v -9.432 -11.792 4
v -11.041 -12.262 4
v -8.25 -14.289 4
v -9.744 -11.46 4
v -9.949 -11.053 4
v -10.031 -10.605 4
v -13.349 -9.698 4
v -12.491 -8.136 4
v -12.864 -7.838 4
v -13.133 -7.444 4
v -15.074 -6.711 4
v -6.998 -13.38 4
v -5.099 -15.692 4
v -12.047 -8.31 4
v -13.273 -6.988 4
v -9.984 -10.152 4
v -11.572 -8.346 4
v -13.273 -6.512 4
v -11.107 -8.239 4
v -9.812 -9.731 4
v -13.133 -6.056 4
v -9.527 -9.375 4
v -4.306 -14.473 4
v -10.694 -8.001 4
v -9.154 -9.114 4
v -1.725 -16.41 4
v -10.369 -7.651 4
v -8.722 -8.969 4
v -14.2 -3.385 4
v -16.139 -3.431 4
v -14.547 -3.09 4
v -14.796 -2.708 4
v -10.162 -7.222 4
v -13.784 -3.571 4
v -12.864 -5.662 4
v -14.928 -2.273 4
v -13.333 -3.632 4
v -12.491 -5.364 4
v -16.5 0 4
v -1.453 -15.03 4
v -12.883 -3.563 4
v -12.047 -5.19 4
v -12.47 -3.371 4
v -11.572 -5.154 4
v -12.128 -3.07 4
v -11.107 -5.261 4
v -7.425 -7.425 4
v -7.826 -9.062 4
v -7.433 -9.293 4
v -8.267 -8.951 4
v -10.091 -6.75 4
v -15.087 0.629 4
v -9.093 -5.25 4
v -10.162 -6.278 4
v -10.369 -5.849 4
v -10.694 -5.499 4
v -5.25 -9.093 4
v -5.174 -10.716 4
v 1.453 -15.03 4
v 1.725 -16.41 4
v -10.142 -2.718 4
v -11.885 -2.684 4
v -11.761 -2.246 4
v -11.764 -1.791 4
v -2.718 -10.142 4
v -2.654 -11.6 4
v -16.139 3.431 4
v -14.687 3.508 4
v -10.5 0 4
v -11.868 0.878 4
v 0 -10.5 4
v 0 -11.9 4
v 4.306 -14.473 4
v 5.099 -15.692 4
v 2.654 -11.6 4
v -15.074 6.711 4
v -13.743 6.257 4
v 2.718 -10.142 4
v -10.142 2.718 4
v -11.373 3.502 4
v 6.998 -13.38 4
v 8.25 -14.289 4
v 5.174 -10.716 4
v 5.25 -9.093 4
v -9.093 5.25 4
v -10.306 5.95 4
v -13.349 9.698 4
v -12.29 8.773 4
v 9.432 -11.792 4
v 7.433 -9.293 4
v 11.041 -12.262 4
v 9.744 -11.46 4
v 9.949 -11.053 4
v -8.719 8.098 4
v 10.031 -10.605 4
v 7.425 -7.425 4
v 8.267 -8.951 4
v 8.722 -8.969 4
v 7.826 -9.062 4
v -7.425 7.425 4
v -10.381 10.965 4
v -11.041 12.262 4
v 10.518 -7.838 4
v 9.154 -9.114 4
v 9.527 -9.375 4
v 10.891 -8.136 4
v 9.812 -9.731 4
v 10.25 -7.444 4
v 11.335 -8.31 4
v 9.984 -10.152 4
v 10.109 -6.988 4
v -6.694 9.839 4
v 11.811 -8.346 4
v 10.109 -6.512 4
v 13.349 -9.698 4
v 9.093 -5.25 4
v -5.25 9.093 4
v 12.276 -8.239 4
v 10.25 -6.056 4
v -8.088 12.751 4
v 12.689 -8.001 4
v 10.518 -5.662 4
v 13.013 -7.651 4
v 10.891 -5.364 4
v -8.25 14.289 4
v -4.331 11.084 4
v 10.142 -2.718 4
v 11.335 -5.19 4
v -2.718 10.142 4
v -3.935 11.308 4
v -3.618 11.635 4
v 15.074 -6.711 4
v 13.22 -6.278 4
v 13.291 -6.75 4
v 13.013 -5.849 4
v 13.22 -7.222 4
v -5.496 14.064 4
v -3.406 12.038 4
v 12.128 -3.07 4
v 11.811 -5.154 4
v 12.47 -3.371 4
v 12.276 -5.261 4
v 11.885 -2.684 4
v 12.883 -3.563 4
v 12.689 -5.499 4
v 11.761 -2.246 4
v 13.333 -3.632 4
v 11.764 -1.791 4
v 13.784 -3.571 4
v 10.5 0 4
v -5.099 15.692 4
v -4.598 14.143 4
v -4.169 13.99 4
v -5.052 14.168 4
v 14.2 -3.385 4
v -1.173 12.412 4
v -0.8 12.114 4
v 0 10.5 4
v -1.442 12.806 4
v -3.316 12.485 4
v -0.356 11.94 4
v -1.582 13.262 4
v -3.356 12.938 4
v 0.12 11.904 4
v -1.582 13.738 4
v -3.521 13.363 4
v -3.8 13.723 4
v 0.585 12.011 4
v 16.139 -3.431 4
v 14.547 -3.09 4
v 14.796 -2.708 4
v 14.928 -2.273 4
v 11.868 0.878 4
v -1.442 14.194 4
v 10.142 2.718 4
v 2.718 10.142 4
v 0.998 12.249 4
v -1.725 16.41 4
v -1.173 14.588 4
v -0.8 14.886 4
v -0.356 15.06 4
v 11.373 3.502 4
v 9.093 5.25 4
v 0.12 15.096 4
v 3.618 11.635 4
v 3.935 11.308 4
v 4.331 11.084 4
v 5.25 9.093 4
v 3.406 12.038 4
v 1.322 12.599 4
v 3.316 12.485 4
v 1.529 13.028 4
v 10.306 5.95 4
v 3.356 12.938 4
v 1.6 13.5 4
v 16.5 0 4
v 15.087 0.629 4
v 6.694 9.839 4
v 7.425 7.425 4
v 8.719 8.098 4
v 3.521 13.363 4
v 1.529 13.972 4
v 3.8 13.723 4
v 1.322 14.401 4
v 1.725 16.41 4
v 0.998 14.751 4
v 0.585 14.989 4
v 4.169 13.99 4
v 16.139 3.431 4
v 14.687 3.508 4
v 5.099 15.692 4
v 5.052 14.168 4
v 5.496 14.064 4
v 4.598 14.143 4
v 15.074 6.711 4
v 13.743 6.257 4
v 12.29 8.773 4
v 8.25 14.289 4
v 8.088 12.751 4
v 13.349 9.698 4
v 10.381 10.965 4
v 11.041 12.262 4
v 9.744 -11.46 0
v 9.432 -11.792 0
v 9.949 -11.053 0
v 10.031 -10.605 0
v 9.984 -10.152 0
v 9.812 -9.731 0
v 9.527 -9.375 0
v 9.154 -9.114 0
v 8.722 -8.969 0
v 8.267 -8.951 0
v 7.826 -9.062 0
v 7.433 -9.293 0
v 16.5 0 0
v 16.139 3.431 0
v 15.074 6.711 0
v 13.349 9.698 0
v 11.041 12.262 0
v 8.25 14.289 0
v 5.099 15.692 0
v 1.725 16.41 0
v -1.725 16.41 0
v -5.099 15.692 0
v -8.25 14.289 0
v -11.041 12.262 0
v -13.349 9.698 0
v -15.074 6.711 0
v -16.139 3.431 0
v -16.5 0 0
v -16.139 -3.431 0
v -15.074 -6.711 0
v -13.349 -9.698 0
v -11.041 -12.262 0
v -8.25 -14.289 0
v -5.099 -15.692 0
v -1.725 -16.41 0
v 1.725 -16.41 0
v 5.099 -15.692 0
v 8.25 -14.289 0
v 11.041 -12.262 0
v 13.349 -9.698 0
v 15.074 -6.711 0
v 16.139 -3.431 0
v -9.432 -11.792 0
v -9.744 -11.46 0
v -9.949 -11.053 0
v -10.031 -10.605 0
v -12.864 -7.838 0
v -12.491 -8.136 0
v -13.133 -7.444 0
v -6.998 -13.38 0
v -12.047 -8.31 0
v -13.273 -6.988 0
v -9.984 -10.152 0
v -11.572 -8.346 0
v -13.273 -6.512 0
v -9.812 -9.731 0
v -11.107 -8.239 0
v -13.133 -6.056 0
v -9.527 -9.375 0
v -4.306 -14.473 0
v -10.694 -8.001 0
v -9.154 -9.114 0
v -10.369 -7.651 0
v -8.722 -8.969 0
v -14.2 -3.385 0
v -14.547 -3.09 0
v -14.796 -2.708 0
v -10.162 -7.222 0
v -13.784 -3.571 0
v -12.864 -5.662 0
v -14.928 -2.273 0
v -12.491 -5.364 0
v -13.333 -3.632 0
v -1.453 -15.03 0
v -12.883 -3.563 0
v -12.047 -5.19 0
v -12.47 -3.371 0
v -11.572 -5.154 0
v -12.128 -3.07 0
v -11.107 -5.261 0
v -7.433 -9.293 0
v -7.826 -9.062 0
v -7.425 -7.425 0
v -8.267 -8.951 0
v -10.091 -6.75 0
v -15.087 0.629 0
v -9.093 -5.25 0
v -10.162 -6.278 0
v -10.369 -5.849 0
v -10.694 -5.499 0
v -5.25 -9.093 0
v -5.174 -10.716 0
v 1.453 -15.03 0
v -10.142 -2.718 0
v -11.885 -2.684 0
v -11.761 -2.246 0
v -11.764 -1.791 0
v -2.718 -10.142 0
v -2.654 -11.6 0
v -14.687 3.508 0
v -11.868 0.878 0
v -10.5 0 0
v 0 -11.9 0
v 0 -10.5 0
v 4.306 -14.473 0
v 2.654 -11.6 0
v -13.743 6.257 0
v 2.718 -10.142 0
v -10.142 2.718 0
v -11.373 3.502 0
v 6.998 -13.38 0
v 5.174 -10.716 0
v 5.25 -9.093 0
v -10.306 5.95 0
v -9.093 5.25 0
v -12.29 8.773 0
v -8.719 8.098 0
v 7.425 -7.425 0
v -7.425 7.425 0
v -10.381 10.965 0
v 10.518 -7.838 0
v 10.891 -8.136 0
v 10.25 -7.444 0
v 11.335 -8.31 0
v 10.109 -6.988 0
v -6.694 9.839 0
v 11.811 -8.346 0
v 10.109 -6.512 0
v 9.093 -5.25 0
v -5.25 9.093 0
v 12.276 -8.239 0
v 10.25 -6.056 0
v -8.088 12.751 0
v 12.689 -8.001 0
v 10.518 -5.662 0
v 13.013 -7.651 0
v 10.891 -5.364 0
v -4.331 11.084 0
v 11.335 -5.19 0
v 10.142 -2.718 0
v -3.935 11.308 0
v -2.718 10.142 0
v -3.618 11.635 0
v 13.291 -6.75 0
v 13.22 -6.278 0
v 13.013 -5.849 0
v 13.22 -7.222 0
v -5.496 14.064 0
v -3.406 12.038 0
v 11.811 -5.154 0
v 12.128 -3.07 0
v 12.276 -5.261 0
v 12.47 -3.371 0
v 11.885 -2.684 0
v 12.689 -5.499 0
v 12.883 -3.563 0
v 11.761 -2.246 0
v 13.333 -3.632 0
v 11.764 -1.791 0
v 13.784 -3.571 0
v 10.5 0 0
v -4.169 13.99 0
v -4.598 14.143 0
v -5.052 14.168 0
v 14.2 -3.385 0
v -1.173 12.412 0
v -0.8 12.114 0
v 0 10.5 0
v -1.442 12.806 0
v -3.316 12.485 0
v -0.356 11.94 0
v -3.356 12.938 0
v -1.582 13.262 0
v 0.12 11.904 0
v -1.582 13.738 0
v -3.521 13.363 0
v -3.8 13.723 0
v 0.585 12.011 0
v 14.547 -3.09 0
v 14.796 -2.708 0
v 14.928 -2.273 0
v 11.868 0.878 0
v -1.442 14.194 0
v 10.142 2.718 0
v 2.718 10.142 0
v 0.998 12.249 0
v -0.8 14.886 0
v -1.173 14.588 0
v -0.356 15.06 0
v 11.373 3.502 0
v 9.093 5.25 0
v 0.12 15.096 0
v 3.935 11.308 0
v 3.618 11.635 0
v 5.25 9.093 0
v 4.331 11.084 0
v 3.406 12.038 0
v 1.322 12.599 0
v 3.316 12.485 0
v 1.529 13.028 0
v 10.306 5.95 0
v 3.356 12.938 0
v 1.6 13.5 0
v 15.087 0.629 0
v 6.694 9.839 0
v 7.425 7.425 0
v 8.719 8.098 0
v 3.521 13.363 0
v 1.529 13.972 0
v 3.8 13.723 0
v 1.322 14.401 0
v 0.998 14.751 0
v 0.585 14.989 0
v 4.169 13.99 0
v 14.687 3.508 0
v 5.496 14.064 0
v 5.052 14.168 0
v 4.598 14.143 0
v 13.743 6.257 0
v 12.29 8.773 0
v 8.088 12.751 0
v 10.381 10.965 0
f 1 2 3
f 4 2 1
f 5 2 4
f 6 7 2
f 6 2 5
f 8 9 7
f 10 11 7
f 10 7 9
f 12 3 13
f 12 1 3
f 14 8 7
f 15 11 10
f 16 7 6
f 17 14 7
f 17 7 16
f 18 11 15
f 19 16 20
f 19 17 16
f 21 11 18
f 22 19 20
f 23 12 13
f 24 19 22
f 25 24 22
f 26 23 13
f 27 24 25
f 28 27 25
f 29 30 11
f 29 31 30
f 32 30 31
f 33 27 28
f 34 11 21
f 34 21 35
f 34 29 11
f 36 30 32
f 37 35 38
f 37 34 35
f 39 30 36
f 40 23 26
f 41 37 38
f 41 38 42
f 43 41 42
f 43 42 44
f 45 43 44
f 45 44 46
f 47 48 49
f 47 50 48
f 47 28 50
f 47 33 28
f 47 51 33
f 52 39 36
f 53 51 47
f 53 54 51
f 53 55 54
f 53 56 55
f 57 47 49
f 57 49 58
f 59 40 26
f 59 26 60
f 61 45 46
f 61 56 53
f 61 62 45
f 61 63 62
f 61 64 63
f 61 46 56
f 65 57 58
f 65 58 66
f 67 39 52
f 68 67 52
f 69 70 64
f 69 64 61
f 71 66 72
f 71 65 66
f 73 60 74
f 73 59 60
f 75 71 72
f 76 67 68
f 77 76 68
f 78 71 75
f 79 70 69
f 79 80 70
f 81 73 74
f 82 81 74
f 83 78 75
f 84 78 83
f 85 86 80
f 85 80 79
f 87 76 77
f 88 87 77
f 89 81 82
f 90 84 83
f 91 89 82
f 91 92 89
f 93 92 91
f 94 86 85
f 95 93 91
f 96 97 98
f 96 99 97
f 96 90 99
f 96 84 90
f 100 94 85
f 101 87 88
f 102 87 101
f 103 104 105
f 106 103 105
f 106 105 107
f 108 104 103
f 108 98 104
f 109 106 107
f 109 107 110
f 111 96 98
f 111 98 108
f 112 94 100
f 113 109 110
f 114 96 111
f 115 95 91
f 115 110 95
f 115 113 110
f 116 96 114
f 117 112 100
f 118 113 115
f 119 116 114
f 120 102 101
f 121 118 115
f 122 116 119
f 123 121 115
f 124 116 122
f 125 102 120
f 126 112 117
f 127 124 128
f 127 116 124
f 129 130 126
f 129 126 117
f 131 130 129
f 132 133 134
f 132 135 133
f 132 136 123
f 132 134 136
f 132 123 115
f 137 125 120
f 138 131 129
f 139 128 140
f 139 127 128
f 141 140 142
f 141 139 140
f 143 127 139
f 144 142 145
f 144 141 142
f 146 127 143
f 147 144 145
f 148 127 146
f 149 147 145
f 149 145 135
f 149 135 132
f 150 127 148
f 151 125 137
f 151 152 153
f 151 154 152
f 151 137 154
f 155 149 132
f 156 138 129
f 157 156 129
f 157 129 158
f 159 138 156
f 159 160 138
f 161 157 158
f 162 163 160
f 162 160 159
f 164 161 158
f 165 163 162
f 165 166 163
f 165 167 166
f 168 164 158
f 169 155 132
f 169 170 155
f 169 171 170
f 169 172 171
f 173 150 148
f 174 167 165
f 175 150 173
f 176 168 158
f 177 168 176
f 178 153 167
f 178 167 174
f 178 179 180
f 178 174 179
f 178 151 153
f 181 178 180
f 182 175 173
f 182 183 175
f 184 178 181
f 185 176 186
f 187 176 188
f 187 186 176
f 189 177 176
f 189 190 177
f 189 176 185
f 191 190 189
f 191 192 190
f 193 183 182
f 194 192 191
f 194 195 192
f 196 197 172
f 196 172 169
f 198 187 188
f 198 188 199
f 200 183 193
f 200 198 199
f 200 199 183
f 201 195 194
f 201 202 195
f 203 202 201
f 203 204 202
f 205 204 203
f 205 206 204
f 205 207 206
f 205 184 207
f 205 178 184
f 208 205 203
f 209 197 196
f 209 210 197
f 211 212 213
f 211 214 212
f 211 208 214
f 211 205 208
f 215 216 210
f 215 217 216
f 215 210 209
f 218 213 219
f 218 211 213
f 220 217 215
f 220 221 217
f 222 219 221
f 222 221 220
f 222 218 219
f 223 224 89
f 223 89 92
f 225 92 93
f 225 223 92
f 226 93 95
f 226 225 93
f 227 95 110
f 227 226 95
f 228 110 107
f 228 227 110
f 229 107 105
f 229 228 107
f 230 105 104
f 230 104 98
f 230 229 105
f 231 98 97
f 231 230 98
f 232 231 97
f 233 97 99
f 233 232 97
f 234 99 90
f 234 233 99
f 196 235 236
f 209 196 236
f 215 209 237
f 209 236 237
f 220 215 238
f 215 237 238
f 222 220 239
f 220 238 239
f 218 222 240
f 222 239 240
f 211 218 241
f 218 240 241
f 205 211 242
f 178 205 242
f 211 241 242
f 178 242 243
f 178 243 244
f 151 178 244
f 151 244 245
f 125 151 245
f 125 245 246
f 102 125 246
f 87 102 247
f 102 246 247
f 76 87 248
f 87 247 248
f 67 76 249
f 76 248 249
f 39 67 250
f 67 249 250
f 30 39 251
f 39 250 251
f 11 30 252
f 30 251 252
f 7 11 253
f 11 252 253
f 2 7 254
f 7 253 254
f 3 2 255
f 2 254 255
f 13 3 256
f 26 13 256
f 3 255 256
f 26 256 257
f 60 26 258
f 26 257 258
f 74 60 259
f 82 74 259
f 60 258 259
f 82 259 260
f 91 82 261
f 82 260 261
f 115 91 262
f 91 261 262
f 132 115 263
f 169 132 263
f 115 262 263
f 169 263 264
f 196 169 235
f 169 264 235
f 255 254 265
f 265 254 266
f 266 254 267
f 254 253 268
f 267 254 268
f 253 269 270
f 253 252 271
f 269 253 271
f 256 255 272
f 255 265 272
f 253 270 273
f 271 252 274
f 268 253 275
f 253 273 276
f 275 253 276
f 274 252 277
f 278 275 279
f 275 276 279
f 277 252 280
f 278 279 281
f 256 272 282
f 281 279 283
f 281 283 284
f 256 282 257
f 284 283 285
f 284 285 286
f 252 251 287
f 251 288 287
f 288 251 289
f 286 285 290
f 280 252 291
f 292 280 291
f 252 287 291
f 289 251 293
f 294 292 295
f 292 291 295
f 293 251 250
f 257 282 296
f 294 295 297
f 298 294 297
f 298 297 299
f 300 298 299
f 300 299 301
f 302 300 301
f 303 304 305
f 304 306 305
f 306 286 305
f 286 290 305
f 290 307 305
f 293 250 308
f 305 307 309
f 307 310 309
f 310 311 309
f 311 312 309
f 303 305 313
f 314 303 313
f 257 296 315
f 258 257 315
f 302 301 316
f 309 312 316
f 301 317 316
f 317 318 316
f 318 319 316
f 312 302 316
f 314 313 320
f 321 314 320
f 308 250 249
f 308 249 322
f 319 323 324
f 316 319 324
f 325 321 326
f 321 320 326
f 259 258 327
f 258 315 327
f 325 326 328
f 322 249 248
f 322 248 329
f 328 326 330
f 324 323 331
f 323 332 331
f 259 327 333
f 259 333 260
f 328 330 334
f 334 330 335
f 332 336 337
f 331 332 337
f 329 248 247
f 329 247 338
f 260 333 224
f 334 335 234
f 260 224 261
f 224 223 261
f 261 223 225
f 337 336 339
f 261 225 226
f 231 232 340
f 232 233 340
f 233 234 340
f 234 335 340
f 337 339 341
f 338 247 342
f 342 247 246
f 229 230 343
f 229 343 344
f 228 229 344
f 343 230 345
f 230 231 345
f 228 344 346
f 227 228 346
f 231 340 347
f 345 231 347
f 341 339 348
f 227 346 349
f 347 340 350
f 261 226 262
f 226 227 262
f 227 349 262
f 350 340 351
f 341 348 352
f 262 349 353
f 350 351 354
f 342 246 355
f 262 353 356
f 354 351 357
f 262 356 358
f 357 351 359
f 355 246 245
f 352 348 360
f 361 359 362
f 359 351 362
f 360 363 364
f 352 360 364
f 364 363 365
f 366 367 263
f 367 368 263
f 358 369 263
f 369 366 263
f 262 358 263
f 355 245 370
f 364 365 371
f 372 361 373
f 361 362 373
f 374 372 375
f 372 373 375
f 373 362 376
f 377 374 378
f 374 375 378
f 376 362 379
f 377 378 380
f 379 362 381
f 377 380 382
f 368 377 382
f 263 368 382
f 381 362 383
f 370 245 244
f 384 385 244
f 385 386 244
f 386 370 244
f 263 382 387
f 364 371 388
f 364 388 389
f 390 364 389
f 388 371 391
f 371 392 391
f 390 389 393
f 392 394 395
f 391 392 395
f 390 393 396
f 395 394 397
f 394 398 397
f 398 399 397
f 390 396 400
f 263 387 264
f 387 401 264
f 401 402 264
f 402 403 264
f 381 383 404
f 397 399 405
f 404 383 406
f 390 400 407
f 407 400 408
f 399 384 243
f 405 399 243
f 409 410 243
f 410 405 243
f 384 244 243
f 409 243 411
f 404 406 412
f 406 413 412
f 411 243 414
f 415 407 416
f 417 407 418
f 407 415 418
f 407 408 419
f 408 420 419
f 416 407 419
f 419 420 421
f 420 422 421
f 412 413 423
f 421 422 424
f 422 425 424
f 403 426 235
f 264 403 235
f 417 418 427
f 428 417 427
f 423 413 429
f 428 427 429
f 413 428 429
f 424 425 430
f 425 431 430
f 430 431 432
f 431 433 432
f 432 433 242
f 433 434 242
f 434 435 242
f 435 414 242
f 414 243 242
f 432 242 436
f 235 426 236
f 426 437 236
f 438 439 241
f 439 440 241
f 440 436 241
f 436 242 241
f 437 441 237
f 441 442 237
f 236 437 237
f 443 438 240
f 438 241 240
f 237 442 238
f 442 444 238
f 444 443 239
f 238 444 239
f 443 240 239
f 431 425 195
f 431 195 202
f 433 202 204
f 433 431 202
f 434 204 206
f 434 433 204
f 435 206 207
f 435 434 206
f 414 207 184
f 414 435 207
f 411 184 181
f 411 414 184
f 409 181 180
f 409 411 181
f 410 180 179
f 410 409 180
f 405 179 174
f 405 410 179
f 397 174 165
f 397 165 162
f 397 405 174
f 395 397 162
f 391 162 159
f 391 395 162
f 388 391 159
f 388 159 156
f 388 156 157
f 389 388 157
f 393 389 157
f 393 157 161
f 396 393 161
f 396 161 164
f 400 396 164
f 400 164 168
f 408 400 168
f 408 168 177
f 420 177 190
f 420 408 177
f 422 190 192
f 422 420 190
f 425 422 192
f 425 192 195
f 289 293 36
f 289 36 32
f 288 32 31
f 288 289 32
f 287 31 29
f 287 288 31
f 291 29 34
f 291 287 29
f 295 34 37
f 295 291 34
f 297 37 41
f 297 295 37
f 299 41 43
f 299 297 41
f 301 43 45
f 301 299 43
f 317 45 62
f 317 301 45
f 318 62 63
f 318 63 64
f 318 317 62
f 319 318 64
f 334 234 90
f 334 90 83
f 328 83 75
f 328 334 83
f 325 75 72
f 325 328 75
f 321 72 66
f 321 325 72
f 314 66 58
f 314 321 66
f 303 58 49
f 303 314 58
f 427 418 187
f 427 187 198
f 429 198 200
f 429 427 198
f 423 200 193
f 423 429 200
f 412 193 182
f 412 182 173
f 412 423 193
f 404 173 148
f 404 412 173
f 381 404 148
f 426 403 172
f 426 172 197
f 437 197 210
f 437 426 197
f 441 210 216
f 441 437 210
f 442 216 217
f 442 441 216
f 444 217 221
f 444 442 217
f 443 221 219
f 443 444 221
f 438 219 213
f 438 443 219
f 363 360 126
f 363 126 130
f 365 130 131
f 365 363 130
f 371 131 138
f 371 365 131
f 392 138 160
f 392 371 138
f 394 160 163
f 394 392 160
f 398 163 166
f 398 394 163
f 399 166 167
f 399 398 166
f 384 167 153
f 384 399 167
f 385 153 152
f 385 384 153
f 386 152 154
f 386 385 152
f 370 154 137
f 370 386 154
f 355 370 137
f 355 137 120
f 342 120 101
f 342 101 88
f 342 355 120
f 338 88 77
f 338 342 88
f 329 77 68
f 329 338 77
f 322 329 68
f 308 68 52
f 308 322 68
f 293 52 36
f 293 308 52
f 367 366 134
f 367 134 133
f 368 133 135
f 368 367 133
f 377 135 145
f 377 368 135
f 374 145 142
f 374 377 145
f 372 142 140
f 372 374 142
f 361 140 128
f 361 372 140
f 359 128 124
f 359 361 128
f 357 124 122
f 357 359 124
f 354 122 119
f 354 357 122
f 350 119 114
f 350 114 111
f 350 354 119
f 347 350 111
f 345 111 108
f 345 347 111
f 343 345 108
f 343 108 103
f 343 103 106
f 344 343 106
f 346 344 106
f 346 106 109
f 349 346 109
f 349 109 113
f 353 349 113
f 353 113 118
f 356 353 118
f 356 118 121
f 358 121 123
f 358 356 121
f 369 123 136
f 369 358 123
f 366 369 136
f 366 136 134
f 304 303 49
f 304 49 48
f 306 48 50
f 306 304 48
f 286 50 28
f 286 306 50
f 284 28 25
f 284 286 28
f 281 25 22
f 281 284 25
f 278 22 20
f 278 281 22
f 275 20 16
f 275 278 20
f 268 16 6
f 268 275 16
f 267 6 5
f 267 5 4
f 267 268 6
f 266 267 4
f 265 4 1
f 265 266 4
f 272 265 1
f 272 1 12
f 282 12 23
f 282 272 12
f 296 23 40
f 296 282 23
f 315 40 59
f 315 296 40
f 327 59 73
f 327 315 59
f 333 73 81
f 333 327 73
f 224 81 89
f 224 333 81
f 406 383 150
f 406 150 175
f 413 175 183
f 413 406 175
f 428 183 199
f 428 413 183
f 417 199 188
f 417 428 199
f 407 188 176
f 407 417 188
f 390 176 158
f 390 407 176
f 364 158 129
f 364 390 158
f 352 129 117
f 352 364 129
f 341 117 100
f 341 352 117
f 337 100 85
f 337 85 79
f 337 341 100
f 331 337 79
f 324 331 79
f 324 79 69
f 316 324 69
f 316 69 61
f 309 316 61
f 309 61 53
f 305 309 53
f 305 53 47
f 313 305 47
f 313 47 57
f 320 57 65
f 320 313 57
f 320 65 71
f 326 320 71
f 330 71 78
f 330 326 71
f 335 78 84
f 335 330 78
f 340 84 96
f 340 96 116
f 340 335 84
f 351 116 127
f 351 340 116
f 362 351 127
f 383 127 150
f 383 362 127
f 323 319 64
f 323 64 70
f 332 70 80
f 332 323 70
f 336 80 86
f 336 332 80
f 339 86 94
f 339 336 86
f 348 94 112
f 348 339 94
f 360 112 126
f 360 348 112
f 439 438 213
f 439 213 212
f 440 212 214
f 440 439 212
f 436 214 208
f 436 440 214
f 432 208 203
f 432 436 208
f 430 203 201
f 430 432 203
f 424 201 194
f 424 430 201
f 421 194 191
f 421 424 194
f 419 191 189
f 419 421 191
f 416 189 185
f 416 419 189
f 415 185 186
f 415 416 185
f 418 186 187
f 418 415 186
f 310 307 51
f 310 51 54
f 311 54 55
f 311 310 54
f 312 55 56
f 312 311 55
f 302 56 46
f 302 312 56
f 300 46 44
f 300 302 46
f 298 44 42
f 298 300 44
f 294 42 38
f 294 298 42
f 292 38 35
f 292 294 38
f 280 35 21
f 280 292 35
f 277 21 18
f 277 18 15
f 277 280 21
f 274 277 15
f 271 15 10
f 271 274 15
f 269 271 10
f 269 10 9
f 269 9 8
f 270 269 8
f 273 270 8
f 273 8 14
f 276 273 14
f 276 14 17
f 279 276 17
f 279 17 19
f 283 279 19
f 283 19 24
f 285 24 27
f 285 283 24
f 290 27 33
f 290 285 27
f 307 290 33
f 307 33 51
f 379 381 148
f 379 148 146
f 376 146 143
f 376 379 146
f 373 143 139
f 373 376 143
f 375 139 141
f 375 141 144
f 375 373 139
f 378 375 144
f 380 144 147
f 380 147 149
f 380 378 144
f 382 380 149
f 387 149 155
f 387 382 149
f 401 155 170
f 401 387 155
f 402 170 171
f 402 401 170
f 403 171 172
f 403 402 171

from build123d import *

# Parameters (mm, degrees)
SKETCH_1_R      = 16.5
SKETCH_1_R_2    = 10.5
SKETCH_1_R_3    = 1.6
EXTRUDE_1_DEPTH = 4


with BuildPart() as part:
    # 草图1 → 凸台-拉伸1 (new body)
    with BuildSketch(Plane.XY):
        Circle(SKETCH_1_R)
        Circle(SKETCH_1_R_2, mode=Mode.SUBTRACT)
        with Locations((0, 13.5)):
            Circle(SKETCH_1_R_3, mode=Mode.SUBTRACT)
        with Locations((11.691342951, -6.75)):
            Circle(SKETCH_1_R_3, mode=Mode.SUBTRACT)
        with Locations((-11.691342951, -6.75)):
            Circle(SKETCH_1_R_3, mode=Mode.SUBTRACT)
        with BuildLine():
            ThreePointArc((-4.331175309, 11.083813443), (-3.423257577, 13.156416973), (-5.495861107, 14.064334705))
            ThreePointArc((-5.495861107, 14.064334705), (-13.076983597, 7.55), (-14.928001695, -2.272612018))
            ThreePointArc((-14.928001695, -2.272612018), (-13.10542011, -3.613580461), (-11.764451667, -1.790998875))
            ThreePointArc((-11.764451667, -1.790998875), (-10.305702305, 5.95), (-4.331175309, 11.083813443))
        make_face(mode=Mode.SUBTRACT)
        with BuildLine():
            ThreePointArc((11.764451667, -1.790998876), (13.10542011, -3.613580461), (14.928001695, -2.272612019))
            ThreePointArc((14.928001695, -2.272612019), (13.076983597, 7.55), (5.495861107, 14.064334705))
            ThreePointArc((5.495861107, 14.064334705), (3.423257577, 13.156416973), (4.331175309, 11.083813443))
            ThreePointArc((4.331175309, 11.083813443), (10.305702305, 5.95), (11.764451667, -1.790998876))
        make_face(mode=Mode.SUBTRACT)
        with BuildLine():
            ThreePointArc((-7.433276358, -9.292814568), (-9.682162533, -9.542836512), (-9.432140589, -11.791722687))
            ThreePointArc((-9.432140589, -11.791722687), (0, -15.1), (9.432140588, -11.791722687))
            ThreePointArc((9.432140588, -11.791722687), (9.682162533, -9.542836512), (7.433276358, -9.292814568))
            ThreePointArc((7.433276358, -9.292814568), (0, -11.9), (-7.433276358, -9.292814568))
        make_face(mode=Mode.SUBTRACT)
    extrude(amount=EXTRUDE_1_DEPTH)


solid = part.part
